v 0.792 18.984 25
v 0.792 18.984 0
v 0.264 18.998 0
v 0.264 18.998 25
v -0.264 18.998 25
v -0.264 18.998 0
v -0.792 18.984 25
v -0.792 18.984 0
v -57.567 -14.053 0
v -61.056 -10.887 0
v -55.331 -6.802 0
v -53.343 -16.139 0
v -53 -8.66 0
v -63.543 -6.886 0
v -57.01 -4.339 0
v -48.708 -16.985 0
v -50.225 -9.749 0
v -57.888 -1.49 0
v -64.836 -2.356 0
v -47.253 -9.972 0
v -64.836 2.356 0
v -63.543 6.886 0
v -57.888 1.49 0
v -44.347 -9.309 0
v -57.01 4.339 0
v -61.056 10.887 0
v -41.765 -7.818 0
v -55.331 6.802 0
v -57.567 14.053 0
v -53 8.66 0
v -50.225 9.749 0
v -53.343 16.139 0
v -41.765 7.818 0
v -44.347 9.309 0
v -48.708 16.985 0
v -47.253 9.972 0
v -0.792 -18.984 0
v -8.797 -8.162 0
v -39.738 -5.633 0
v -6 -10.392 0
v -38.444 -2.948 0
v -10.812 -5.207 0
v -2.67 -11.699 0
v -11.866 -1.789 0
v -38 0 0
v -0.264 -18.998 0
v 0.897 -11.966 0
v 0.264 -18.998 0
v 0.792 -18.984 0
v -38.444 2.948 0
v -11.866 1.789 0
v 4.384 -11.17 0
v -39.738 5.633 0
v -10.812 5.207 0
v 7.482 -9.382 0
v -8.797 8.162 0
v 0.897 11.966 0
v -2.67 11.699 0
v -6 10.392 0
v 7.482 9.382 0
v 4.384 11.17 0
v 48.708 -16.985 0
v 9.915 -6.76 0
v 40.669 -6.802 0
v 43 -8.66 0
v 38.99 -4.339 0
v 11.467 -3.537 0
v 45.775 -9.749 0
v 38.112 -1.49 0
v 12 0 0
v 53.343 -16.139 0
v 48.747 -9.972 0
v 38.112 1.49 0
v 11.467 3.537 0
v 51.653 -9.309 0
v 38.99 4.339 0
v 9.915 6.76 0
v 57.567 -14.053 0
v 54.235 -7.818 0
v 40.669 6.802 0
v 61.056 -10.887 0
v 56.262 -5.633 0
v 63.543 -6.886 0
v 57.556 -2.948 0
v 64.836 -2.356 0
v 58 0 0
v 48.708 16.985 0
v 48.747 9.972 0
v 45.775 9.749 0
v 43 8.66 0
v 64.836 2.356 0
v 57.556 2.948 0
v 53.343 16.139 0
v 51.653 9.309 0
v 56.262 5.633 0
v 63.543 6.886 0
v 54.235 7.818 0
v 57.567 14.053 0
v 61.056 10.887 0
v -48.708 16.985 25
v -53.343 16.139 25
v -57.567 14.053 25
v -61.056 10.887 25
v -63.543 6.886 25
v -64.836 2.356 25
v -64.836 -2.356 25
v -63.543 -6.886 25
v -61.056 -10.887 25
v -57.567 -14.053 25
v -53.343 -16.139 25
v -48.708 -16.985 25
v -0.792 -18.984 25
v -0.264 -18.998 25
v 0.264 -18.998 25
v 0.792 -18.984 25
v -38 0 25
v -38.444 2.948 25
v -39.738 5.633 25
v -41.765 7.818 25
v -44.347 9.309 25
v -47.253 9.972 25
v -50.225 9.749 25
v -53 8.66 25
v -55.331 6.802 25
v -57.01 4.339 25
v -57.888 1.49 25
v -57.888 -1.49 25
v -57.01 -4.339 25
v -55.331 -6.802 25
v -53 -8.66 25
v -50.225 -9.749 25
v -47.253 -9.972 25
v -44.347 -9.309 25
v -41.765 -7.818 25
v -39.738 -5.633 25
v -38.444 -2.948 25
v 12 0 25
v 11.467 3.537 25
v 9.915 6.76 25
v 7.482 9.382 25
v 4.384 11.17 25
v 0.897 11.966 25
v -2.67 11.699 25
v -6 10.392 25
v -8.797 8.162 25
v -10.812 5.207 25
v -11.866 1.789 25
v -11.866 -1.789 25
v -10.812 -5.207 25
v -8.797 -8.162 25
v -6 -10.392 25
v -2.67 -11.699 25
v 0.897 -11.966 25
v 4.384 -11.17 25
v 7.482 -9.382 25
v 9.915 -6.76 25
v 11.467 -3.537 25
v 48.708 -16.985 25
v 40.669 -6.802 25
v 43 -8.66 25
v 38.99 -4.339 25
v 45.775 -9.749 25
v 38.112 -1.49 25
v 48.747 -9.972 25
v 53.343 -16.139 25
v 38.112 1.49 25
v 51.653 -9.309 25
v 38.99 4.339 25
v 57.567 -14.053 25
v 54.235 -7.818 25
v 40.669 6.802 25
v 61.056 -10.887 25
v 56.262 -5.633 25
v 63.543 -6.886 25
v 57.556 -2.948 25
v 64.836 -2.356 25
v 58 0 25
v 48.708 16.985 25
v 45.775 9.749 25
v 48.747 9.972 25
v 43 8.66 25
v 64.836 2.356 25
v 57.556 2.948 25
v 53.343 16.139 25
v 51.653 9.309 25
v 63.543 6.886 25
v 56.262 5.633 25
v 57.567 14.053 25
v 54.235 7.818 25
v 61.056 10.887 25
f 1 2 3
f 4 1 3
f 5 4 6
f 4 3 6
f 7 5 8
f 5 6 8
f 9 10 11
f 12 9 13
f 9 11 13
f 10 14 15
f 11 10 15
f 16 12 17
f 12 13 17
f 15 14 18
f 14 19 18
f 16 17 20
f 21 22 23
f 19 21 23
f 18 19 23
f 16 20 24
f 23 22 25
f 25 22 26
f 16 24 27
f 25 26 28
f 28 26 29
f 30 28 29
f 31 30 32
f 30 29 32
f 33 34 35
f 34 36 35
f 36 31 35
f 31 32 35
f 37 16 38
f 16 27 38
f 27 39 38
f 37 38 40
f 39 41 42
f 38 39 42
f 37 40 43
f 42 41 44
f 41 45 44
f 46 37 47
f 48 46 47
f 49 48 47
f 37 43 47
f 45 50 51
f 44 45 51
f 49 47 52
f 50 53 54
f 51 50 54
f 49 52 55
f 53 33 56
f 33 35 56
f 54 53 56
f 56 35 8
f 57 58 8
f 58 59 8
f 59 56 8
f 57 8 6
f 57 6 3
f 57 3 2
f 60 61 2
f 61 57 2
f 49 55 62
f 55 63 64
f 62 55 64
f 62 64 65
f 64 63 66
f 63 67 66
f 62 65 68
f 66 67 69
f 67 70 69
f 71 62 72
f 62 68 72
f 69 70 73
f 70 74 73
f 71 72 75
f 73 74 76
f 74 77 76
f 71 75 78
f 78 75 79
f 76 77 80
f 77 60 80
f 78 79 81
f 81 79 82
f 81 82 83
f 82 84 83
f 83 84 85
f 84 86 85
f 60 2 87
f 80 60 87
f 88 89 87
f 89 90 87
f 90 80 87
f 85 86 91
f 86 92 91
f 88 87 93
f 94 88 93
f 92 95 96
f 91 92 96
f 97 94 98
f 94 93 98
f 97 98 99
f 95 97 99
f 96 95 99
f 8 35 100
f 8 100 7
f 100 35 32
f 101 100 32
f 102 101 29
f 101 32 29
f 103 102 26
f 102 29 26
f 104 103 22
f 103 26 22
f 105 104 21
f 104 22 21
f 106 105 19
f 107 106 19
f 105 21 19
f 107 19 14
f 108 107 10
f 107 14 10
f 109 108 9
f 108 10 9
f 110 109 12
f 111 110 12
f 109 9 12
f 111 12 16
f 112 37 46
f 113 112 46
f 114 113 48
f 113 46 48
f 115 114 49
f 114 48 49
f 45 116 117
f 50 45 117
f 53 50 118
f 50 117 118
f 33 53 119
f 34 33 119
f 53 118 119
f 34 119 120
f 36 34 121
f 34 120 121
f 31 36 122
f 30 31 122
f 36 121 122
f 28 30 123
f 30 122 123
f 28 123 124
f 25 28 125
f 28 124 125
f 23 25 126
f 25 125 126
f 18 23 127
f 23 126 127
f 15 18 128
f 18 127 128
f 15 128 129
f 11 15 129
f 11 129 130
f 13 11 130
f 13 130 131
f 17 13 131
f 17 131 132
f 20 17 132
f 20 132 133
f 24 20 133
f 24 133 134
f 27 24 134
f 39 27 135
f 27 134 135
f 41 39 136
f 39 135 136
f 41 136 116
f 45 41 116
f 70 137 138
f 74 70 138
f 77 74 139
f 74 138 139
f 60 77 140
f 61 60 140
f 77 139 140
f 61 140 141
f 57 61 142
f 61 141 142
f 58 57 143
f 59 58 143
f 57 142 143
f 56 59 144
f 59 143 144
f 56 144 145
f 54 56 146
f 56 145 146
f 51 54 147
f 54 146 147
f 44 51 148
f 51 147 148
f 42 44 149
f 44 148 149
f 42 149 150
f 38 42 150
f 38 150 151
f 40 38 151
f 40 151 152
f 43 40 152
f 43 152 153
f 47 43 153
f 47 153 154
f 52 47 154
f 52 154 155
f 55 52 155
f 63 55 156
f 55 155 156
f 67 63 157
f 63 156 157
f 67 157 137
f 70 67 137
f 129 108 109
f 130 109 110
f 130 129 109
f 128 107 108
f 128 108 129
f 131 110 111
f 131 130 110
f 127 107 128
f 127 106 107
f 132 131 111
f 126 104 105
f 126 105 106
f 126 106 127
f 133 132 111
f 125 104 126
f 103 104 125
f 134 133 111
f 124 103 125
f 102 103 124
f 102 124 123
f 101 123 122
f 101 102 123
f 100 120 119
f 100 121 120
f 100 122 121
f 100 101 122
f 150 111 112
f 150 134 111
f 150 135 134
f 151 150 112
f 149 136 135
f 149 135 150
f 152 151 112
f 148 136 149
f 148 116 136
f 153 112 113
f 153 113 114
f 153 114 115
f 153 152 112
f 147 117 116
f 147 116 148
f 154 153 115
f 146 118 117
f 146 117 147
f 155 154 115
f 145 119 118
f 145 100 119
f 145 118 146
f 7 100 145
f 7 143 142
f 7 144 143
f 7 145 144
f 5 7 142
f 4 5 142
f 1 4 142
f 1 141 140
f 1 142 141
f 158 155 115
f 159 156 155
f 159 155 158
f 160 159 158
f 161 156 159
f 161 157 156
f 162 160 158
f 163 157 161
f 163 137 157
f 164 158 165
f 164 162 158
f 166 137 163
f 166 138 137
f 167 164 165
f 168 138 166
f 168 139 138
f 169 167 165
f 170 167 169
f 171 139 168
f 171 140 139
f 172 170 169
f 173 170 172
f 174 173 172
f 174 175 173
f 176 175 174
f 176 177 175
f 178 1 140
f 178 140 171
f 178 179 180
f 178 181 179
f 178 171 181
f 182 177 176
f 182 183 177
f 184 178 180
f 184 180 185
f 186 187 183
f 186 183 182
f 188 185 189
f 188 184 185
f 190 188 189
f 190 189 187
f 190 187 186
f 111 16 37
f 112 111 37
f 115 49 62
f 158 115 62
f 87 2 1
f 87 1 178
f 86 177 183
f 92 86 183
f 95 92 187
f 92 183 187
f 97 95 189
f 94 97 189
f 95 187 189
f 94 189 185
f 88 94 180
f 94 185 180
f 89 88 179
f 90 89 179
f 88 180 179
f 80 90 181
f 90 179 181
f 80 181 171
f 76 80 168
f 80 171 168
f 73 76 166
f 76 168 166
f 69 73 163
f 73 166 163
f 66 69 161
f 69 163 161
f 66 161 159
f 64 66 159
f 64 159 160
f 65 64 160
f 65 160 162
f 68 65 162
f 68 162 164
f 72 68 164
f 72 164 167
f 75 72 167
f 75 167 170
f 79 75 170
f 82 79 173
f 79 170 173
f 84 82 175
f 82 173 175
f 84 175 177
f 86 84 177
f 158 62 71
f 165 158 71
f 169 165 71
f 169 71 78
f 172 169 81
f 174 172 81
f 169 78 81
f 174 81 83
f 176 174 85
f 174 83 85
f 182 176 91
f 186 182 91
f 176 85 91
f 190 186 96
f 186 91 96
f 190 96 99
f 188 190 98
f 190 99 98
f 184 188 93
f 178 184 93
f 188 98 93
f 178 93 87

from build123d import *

# Parameters (mm, degrees)
PAD_DEPTH     = 25
SKETCH001_R   = 12
SKETCH001_R_2 = 10
POCKET_DEPTH  = 25


with BuildPart() as part:
    # Sketch → Pad (new body)
    with BuildSketch(Plane.XY):
        with BuildLine():
            ThreePointArc((-48.708302, 16.985238), (-65, 1.6e-05), (-48.708334, -16.985237))
            Line((-48.708334, -16.985237), (-0.791666, -18.9835))
            ThreePointArc((-0.791666, -18.9835), (0, -19), (0.791666, -18.9835))
            Line((0.791666, -18.9835), (48.708335, -16.985237))
            ThreePointArc((48.708335, -16.985237), (65, 1e-06), (48.708333, 16.985237))
            Line((0.791666, 18.9835), (48.708333, 16.985237))
            ThreePointArc((0.791666, 18.9835), (0, 19), (-0.791667, 18.9835))
            Line((-48.708302, 16.985238), (-0.791667, 18.9835))
        make_face()
    extrude(amount=PAD_DEPTH)

    # Sketch001 (on Face10 of Pad) → Pocket (cut)
    with BuildSketch(Plane.XY.offset(25)):
        Circle(SKETCH001_R)
        with Locations((48, 0)):
            Circle(SKETCH001_R_2)
        with Locations((-48, 0)):
            Circle(SKETCH001_R_2)
    extrude(amount=-POCKET_DEPTH, mode=Mode.SUBTRACT)


solid = part.part
